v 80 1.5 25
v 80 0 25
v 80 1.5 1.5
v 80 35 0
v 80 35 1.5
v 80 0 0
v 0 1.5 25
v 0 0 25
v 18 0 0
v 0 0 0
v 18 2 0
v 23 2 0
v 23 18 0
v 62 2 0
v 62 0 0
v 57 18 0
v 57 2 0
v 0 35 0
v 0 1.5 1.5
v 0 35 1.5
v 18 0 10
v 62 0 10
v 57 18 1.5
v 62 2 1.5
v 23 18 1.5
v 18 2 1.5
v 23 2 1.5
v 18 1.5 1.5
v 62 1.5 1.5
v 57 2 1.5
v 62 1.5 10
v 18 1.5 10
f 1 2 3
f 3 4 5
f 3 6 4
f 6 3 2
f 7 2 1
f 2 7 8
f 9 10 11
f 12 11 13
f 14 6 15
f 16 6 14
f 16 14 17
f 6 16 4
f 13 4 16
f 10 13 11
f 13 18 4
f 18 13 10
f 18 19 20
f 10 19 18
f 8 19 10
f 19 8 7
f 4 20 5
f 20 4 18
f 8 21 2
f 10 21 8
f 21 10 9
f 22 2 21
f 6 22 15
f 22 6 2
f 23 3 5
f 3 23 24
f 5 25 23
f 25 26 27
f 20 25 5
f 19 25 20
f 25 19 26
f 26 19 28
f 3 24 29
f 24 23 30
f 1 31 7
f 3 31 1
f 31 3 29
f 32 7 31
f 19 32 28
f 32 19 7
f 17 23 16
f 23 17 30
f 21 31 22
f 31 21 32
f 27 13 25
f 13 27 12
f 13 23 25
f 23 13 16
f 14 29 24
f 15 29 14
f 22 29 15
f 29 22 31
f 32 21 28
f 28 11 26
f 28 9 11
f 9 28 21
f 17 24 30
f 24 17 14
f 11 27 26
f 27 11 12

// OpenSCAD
StandDepth = 35;
StandHeight = 25;
StandWidth = 80;
StandBorder=1.5;

StripeWidth = 7;
StripeBorder = 1.5;
StripeOuterWidth = StripeWidth+2*StripeBorder;
StripeBottom = 2;
StripeHeight = 14;
CableHeight = 2;

ConnectorGap = 20;
StandConnectorHeight = 10;
StandConnectorWidth = 44;
StandConnectorInnerWidth = StandConnectorWidth - 2*5;

Depth = StripeBottom + StripeHeight + CableHeight;

//Connector();
Stand();

module Stand()
{
    difference()
    {
        cube([StandWidth, StandDepth, StandHeight]);
        translate([0, StandBorder, StandBorder])
        {
            cube([StandWidth, StandDepth, StandHeight-StandBorder]);
        }
        
        translate([(StandWidth-StandConnectorInnerWidth)/2, 0, 0])
            cube([StandConnectorInnerWidth, Depth, StandConnectorHeight]);
        translate([(StandWidth-StandConnectorWidth)/2, 0, 0])
            cube([StandConnectorWidth, StripeBottom, StandConnectorHeight]);
    }   
}

module Connector()
{
    cube([StandWidth, StandDepth-2*StandBorder, StandConnectorHeight]);
}
